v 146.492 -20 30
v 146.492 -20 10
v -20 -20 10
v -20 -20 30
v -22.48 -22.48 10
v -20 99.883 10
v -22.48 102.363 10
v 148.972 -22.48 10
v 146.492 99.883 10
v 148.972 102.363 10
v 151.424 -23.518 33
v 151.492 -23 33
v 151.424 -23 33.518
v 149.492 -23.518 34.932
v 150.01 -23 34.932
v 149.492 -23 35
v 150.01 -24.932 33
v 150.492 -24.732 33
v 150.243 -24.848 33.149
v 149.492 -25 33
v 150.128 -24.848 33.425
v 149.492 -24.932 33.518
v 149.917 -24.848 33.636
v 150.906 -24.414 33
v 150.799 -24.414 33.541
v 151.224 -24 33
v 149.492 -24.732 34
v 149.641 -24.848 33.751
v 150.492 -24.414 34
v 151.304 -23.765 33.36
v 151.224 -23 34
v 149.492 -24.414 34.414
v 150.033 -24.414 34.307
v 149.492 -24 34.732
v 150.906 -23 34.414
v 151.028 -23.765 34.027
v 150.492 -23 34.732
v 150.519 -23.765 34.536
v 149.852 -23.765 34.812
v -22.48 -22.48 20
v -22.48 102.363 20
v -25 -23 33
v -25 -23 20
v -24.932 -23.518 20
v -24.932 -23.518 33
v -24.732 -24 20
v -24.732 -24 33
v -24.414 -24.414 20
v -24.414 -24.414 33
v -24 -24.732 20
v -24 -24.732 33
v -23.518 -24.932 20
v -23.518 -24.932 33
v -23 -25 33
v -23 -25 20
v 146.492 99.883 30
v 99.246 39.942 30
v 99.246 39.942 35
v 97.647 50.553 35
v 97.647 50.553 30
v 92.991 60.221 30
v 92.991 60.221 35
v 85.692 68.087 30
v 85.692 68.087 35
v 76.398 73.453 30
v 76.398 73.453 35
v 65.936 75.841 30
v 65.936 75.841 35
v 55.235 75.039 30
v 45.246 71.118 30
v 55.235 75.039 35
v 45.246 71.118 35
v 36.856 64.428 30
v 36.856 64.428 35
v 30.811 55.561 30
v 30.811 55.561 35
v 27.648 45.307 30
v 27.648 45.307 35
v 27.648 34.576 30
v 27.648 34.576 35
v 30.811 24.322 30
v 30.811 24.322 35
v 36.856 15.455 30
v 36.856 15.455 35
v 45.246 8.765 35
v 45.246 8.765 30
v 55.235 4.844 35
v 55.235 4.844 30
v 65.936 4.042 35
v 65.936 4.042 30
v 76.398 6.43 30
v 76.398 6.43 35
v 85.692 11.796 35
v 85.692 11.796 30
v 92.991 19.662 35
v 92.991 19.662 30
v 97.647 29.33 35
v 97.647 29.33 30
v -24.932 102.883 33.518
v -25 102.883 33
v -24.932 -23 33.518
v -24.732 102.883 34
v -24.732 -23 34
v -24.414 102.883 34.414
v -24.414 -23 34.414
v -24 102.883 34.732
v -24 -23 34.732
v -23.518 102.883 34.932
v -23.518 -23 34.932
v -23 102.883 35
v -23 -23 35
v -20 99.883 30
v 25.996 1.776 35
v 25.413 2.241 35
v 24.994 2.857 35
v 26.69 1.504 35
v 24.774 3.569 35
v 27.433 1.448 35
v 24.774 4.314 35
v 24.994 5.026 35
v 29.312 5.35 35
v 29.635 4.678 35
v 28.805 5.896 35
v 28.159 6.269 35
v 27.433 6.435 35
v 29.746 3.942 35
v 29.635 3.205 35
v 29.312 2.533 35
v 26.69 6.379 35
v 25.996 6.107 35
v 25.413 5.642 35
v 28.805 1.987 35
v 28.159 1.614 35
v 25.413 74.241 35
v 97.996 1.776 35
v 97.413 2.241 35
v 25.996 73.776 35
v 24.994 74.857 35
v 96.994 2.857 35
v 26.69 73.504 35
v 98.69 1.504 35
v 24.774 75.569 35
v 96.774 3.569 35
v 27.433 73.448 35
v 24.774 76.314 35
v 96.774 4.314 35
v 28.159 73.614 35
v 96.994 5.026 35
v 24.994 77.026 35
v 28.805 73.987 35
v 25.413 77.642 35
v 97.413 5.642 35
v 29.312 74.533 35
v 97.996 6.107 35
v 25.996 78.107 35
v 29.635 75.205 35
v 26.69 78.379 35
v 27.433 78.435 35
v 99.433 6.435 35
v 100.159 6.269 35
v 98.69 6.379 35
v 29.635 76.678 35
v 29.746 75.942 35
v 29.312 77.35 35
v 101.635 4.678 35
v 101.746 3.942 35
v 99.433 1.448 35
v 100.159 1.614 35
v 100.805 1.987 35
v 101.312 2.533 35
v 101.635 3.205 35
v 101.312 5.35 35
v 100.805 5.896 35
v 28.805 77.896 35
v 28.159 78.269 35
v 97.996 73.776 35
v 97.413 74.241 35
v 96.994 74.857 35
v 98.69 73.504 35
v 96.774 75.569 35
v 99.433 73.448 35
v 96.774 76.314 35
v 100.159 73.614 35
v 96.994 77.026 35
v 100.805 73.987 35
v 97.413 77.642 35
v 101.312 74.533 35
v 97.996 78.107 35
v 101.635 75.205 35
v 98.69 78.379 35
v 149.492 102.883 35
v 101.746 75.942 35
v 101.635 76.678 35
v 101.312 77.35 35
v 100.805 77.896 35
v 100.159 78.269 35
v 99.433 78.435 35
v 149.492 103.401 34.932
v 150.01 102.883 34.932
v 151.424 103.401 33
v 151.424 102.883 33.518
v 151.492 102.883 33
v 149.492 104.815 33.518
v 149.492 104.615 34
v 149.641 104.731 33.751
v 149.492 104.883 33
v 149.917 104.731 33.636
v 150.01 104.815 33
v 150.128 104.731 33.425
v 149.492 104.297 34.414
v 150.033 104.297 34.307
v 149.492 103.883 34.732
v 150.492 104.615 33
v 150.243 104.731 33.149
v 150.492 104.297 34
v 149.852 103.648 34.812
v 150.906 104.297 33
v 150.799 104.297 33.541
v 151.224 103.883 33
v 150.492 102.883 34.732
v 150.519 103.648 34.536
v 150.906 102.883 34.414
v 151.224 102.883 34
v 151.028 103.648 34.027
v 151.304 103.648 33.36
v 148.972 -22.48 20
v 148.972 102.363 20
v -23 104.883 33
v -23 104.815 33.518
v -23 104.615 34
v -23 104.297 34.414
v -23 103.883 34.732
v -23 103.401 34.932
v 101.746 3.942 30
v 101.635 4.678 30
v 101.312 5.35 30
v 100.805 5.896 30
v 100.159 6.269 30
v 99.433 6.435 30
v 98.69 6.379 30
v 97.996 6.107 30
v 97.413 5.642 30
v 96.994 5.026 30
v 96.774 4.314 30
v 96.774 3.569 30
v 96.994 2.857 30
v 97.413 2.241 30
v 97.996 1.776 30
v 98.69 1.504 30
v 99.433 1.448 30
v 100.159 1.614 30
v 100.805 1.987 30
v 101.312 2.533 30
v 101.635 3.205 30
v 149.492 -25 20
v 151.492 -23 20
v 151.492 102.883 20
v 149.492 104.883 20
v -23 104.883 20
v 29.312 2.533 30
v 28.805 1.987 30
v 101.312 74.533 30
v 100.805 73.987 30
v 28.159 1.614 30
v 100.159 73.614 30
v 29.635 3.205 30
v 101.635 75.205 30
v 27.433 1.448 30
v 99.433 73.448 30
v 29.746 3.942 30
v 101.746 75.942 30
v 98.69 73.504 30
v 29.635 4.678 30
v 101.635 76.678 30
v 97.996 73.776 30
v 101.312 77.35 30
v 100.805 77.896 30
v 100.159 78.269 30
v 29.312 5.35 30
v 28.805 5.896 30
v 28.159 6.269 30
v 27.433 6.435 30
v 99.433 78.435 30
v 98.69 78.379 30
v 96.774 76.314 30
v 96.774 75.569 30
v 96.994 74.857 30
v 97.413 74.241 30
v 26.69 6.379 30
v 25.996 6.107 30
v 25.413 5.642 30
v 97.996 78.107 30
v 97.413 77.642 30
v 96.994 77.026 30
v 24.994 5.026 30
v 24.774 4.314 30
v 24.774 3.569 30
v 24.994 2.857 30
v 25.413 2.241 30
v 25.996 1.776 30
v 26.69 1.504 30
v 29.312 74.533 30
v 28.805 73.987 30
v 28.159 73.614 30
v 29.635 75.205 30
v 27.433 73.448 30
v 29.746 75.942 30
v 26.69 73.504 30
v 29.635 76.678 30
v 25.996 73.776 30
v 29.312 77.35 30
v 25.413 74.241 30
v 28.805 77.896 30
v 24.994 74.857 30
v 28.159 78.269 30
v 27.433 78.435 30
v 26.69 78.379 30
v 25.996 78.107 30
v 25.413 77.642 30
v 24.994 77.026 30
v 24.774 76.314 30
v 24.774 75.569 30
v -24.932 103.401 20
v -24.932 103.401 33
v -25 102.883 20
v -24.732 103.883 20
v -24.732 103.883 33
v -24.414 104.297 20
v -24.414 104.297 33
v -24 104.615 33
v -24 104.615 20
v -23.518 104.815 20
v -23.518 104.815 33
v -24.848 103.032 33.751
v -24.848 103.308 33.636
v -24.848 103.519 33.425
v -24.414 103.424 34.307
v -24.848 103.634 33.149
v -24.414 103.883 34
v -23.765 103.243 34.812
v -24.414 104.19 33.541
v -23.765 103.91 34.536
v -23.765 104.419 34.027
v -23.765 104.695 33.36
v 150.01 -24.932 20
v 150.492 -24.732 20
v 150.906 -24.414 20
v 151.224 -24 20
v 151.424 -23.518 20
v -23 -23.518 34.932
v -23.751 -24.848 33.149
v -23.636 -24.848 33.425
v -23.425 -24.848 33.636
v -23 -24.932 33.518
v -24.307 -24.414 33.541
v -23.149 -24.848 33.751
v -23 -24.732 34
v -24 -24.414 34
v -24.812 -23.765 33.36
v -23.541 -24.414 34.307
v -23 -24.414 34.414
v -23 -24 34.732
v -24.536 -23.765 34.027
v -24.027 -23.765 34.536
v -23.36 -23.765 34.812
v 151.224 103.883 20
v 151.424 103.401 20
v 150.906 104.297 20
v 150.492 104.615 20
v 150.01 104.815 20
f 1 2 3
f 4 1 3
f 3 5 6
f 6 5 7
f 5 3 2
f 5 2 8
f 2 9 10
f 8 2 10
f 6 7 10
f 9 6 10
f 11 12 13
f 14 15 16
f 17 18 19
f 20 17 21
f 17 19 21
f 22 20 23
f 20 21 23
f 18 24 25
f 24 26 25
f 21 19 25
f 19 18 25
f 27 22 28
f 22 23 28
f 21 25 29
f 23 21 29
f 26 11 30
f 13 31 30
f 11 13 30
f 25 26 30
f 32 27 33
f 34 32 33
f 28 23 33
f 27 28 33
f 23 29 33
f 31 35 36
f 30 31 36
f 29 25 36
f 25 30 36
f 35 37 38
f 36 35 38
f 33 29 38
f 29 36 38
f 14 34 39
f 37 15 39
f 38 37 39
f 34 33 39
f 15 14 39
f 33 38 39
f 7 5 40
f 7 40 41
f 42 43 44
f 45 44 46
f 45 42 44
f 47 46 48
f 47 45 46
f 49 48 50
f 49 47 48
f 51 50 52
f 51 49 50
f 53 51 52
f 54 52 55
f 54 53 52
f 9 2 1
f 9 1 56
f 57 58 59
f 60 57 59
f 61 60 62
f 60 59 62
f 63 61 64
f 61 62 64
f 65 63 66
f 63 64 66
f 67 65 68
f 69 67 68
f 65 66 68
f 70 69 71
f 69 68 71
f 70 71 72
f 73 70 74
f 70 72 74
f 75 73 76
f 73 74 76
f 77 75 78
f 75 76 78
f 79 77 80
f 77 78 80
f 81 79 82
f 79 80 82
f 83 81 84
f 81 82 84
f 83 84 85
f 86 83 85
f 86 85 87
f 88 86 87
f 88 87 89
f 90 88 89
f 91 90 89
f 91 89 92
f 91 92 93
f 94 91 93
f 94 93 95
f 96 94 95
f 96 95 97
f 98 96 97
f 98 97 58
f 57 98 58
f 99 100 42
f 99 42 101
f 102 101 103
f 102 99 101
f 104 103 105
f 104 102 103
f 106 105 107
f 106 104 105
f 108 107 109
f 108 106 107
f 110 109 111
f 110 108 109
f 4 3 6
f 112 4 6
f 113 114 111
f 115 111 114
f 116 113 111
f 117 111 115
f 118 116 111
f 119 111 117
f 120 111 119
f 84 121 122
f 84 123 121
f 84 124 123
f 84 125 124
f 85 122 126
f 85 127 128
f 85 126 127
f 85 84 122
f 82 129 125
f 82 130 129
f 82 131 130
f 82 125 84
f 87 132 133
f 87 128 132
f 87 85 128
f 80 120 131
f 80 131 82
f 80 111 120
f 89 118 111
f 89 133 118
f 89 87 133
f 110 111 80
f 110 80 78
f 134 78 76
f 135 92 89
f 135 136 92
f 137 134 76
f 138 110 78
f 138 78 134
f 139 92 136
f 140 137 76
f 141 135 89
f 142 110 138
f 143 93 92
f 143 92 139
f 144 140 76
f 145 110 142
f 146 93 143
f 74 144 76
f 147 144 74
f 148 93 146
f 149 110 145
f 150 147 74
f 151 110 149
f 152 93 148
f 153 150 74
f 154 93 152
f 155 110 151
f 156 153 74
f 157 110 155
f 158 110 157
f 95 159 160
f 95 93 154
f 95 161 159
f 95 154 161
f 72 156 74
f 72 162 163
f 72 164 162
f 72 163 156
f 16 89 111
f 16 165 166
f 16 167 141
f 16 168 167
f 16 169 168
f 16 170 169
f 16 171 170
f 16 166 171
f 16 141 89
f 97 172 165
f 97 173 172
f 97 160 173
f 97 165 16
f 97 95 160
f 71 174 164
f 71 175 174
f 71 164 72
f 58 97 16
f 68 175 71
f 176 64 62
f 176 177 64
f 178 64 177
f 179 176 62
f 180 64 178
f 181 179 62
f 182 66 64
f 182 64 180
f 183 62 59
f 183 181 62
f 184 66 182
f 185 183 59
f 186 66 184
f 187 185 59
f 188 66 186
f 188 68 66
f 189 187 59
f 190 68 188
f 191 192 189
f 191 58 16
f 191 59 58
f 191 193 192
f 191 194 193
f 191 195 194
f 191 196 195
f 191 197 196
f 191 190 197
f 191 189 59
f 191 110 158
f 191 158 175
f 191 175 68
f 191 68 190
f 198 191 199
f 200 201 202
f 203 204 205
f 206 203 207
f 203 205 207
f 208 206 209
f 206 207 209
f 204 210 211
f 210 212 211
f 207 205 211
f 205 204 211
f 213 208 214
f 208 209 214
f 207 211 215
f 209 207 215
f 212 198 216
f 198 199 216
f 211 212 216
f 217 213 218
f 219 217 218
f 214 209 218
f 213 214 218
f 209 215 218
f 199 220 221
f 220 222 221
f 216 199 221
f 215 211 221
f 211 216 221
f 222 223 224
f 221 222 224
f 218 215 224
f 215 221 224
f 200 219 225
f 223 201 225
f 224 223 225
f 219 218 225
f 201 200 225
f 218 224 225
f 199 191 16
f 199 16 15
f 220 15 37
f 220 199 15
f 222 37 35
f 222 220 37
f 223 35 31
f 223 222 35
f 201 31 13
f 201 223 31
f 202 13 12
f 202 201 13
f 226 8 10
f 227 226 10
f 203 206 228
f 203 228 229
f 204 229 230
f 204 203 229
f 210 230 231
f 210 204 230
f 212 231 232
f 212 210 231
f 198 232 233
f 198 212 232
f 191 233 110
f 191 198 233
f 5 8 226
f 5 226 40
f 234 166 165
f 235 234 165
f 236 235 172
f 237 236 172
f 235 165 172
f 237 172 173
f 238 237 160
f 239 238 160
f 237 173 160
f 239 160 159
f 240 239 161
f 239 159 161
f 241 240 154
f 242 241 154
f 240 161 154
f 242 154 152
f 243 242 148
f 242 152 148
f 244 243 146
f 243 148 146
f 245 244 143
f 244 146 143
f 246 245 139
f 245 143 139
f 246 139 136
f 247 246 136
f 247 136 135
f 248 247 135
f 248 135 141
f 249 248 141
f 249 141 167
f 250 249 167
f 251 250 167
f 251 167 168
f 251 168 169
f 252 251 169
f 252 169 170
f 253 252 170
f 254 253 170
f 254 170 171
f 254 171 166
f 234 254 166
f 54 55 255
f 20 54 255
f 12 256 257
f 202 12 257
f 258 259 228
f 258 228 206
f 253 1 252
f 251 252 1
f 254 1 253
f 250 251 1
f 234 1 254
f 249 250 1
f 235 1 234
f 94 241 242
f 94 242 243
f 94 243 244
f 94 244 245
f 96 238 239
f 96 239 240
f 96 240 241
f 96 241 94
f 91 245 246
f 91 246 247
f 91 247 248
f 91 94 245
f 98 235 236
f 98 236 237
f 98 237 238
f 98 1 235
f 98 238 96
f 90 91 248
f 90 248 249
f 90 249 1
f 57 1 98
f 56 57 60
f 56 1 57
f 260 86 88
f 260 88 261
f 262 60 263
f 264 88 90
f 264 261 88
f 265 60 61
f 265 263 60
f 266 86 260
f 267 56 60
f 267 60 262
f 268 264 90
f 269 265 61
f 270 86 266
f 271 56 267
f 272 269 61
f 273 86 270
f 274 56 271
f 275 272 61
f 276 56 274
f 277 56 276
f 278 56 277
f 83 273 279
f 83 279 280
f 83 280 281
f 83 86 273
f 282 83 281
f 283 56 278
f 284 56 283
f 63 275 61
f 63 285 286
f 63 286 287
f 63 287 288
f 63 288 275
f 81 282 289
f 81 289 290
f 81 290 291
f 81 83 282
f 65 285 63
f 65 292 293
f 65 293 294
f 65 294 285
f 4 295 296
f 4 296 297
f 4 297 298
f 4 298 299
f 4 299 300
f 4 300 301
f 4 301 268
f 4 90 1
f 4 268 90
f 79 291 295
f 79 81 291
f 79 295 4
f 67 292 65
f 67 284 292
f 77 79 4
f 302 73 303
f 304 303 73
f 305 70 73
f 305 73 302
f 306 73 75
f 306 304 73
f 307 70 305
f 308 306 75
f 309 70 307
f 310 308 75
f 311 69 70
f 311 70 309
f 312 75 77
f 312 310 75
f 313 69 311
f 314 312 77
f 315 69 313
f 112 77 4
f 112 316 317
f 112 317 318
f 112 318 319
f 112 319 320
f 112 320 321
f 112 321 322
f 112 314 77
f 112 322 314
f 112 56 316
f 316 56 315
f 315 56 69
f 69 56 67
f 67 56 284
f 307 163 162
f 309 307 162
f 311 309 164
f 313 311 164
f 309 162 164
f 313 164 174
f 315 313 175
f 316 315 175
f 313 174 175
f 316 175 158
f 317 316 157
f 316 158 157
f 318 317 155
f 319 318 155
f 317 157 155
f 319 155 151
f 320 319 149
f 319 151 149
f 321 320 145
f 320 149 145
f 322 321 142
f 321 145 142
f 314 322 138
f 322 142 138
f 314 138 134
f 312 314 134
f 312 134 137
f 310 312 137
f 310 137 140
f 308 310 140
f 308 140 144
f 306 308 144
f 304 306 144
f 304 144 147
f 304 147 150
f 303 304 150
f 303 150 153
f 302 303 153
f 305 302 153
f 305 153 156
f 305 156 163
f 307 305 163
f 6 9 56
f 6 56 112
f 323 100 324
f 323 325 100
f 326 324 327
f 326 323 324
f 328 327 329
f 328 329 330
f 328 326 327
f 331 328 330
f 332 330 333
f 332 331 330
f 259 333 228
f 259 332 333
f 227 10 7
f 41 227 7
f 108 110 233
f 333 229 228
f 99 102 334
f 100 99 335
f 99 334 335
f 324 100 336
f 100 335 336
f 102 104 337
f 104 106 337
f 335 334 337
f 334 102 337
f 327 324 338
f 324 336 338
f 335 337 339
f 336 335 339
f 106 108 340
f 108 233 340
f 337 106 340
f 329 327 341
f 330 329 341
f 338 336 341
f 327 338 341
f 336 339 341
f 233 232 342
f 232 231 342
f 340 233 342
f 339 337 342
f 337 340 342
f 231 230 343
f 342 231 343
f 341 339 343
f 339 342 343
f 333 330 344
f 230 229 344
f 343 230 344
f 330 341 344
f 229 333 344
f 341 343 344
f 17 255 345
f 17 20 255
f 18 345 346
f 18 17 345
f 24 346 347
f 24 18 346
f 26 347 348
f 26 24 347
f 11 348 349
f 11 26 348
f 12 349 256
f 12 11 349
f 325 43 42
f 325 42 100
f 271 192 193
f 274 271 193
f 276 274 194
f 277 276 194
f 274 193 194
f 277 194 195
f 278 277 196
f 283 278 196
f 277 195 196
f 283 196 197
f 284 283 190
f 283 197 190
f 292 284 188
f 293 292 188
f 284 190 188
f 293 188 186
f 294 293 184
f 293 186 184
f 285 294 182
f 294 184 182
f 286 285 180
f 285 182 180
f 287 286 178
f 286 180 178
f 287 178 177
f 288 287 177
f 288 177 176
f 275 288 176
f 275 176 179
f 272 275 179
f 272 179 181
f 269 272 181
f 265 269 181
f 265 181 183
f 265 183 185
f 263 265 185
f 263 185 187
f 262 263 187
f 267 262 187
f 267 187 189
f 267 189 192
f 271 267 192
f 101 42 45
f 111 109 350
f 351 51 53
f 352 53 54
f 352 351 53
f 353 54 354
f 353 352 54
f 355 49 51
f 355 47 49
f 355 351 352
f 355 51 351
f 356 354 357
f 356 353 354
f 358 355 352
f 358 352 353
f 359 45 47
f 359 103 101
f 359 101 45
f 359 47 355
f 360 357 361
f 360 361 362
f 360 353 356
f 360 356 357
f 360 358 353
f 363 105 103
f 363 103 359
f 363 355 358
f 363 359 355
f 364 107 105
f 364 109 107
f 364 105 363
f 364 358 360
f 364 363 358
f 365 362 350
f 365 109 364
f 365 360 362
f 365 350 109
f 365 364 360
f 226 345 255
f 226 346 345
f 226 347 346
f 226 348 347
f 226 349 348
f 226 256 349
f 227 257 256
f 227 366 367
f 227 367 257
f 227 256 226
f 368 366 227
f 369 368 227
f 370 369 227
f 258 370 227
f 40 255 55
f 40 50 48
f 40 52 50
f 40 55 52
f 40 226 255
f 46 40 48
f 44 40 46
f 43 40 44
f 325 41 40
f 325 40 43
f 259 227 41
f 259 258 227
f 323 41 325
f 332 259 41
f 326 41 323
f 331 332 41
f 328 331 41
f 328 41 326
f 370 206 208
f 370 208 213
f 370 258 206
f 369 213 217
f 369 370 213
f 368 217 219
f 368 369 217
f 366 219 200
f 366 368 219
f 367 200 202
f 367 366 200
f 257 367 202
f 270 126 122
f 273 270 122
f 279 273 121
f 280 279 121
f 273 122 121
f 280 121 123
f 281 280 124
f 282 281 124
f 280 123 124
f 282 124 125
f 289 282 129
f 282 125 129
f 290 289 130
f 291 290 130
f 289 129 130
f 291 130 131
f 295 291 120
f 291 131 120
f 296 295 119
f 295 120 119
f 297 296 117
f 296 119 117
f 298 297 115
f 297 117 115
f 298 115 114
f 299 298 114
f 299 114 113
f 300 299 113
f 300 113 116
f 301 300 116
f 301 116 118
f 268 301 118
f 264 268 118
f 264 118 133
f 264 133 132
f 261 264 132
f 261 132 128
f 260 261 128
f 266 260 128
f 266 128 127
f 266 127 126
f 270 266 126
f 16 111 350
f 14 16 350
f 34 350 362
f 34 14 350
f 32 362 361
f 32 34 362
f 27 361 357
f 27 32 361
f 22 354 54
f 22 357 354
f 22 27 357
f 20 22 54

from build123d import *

# Parameters (mm, degrees)
SKETCH4_W           = 176.492
SKETCH4_H           = 129.883
BOSS_EXTRUDE1_DEPTH = 25
SKETCH5_OUTSIDE_W   = 222.602
SKETCH5_OUTSIDE_H   = 175.993
SKETCH5_OUTSIDE_W_2 = 176.492
SKETCH5_OUTSIDE_H_2 = 129.883
SKETCH5_OUTSIDE_W_3 = 166.492
SKETCH5_OUTSIDE_H_3 = 119.883
CUT_EXTRUDE1_DEPTH  = 20
SKETCH7_W           = 176.492
SKETCH7_H           = 129.883
SKETCH7_W_2         = 171.452
SKETCH7_H_2         = 124.843
CUT_EXTRUDE2_DEPTH  = 10
SKETCH12_R          = 36
CUT_EXTRUDE3_DEPTH  = 15
SKETCH13_R          = 2.5
CUT_EXTRUDE4_DEPTH  = 15
FILLET1_R           = 2


with BuildPart() as part:
    # Sketch4 → Boss-Extrude1 (new body)
    with BuildSketch(Plane.XY.offset(10)):
        with Locations((63.246, 39.9415)):
            Rectangle(SKETCH4_W, SKETCH4_H)
    extrude(amount=BOSS_EXTRUDE1_DEPTH)

    # Sketch5 outside → Cut-Extrude1 (cut)
    with BuildSketch(Plane(origin=(0, 0, 10), x_dir=(-1, 0, 0), z_dir=(0, 0, -1))):
        with Locations((-63.246, 39.9415)):
            Rectangle(SKETCH5_OUTSIDE_W, SKETCH5_OUTSIDE_H)
        with Locations((-63.246, 39.9415)):
            Rectangle(SKETCH5_OUTSIDE_W_2, SKETCH5_OUTSIDE_H_2, mode=Mode.SUBTRACT)
        with Locations((-63.246, 39.9415)):
            Rectangle(SKETCH5_OUTSIDE_W_3, SKETCH5_OUTSIDE_H_3)
    extrude(amount=-CUT_EXTRUDE1_DEPTH, mode=Mode.SUBTRACT)

    # Sketch7 → Cut-Extrude2 (cut)
    with BuildSketch(Plane(origin=(0, 0, 10), x_dir=(-1, 0, 0), z_dir=(0, 0, -1))):
        with Locations((-63.246, 39.9415)):
            Rectangle(SKETCH7_W, SKETCH7_H)
        with Locations((-63.246, 39.9415)):
            Rectangle(SKETCH7_W_2, SKETCH7_H_2, mode=Mode.SUBTRACT)
    extrude(amount=-CUT_EXTRUDE2_DEPTH, mode=Mode.SUBTRACT)

    # Sketch12 → Cut-Extrude3 (cut)
    with BuildSketch(Plane.XY.offset(35)):
        with Locations((63.246, 39.9415)):
            Circle(SKETCH12_R)
    extrude(amount=-CUT_EXTRUDE3_DEPTH, mode=Mode.SUBTRACT)

    # Sketch13 → Cut-Extrude4 (cut)
    with BuildSketch(Plane.XY.offset(35)):
        with Locations((27.246, 75.9415)):
            Circle(SKETCH13_R)
        with Locations((99.246, 75.9415)):
            Circle(SKETCH13_R)
        with Locations((99.246, 3.9415)):
            Circle(SKETCH13_R)
        with Locations((27.246, 3.9415)):
            Circle(SKETCH13_R)
    extrude(amount=-CUT_EXTRUDE4_DEPTH, mode=Mode.SUBTRACT)

    # Fillet1
    fillet1_edges = [part.edges().sort_by_distance(p)[0] for p in [
        (151.492, 39.9415, 35),
        (63.246, 104.883, 35),
        (-25, 39.9415, 35),
        (-25, 104.883, 27.5),
        (151.492, 104.883, 27.5),
        (151.492, -25, 27.5),
        (-25, -25, 27.5),
        (63.246, -25, 35),
    ]]
    fillet(fillet1_edges, radius=FILLET1_R)


solid = part.part
